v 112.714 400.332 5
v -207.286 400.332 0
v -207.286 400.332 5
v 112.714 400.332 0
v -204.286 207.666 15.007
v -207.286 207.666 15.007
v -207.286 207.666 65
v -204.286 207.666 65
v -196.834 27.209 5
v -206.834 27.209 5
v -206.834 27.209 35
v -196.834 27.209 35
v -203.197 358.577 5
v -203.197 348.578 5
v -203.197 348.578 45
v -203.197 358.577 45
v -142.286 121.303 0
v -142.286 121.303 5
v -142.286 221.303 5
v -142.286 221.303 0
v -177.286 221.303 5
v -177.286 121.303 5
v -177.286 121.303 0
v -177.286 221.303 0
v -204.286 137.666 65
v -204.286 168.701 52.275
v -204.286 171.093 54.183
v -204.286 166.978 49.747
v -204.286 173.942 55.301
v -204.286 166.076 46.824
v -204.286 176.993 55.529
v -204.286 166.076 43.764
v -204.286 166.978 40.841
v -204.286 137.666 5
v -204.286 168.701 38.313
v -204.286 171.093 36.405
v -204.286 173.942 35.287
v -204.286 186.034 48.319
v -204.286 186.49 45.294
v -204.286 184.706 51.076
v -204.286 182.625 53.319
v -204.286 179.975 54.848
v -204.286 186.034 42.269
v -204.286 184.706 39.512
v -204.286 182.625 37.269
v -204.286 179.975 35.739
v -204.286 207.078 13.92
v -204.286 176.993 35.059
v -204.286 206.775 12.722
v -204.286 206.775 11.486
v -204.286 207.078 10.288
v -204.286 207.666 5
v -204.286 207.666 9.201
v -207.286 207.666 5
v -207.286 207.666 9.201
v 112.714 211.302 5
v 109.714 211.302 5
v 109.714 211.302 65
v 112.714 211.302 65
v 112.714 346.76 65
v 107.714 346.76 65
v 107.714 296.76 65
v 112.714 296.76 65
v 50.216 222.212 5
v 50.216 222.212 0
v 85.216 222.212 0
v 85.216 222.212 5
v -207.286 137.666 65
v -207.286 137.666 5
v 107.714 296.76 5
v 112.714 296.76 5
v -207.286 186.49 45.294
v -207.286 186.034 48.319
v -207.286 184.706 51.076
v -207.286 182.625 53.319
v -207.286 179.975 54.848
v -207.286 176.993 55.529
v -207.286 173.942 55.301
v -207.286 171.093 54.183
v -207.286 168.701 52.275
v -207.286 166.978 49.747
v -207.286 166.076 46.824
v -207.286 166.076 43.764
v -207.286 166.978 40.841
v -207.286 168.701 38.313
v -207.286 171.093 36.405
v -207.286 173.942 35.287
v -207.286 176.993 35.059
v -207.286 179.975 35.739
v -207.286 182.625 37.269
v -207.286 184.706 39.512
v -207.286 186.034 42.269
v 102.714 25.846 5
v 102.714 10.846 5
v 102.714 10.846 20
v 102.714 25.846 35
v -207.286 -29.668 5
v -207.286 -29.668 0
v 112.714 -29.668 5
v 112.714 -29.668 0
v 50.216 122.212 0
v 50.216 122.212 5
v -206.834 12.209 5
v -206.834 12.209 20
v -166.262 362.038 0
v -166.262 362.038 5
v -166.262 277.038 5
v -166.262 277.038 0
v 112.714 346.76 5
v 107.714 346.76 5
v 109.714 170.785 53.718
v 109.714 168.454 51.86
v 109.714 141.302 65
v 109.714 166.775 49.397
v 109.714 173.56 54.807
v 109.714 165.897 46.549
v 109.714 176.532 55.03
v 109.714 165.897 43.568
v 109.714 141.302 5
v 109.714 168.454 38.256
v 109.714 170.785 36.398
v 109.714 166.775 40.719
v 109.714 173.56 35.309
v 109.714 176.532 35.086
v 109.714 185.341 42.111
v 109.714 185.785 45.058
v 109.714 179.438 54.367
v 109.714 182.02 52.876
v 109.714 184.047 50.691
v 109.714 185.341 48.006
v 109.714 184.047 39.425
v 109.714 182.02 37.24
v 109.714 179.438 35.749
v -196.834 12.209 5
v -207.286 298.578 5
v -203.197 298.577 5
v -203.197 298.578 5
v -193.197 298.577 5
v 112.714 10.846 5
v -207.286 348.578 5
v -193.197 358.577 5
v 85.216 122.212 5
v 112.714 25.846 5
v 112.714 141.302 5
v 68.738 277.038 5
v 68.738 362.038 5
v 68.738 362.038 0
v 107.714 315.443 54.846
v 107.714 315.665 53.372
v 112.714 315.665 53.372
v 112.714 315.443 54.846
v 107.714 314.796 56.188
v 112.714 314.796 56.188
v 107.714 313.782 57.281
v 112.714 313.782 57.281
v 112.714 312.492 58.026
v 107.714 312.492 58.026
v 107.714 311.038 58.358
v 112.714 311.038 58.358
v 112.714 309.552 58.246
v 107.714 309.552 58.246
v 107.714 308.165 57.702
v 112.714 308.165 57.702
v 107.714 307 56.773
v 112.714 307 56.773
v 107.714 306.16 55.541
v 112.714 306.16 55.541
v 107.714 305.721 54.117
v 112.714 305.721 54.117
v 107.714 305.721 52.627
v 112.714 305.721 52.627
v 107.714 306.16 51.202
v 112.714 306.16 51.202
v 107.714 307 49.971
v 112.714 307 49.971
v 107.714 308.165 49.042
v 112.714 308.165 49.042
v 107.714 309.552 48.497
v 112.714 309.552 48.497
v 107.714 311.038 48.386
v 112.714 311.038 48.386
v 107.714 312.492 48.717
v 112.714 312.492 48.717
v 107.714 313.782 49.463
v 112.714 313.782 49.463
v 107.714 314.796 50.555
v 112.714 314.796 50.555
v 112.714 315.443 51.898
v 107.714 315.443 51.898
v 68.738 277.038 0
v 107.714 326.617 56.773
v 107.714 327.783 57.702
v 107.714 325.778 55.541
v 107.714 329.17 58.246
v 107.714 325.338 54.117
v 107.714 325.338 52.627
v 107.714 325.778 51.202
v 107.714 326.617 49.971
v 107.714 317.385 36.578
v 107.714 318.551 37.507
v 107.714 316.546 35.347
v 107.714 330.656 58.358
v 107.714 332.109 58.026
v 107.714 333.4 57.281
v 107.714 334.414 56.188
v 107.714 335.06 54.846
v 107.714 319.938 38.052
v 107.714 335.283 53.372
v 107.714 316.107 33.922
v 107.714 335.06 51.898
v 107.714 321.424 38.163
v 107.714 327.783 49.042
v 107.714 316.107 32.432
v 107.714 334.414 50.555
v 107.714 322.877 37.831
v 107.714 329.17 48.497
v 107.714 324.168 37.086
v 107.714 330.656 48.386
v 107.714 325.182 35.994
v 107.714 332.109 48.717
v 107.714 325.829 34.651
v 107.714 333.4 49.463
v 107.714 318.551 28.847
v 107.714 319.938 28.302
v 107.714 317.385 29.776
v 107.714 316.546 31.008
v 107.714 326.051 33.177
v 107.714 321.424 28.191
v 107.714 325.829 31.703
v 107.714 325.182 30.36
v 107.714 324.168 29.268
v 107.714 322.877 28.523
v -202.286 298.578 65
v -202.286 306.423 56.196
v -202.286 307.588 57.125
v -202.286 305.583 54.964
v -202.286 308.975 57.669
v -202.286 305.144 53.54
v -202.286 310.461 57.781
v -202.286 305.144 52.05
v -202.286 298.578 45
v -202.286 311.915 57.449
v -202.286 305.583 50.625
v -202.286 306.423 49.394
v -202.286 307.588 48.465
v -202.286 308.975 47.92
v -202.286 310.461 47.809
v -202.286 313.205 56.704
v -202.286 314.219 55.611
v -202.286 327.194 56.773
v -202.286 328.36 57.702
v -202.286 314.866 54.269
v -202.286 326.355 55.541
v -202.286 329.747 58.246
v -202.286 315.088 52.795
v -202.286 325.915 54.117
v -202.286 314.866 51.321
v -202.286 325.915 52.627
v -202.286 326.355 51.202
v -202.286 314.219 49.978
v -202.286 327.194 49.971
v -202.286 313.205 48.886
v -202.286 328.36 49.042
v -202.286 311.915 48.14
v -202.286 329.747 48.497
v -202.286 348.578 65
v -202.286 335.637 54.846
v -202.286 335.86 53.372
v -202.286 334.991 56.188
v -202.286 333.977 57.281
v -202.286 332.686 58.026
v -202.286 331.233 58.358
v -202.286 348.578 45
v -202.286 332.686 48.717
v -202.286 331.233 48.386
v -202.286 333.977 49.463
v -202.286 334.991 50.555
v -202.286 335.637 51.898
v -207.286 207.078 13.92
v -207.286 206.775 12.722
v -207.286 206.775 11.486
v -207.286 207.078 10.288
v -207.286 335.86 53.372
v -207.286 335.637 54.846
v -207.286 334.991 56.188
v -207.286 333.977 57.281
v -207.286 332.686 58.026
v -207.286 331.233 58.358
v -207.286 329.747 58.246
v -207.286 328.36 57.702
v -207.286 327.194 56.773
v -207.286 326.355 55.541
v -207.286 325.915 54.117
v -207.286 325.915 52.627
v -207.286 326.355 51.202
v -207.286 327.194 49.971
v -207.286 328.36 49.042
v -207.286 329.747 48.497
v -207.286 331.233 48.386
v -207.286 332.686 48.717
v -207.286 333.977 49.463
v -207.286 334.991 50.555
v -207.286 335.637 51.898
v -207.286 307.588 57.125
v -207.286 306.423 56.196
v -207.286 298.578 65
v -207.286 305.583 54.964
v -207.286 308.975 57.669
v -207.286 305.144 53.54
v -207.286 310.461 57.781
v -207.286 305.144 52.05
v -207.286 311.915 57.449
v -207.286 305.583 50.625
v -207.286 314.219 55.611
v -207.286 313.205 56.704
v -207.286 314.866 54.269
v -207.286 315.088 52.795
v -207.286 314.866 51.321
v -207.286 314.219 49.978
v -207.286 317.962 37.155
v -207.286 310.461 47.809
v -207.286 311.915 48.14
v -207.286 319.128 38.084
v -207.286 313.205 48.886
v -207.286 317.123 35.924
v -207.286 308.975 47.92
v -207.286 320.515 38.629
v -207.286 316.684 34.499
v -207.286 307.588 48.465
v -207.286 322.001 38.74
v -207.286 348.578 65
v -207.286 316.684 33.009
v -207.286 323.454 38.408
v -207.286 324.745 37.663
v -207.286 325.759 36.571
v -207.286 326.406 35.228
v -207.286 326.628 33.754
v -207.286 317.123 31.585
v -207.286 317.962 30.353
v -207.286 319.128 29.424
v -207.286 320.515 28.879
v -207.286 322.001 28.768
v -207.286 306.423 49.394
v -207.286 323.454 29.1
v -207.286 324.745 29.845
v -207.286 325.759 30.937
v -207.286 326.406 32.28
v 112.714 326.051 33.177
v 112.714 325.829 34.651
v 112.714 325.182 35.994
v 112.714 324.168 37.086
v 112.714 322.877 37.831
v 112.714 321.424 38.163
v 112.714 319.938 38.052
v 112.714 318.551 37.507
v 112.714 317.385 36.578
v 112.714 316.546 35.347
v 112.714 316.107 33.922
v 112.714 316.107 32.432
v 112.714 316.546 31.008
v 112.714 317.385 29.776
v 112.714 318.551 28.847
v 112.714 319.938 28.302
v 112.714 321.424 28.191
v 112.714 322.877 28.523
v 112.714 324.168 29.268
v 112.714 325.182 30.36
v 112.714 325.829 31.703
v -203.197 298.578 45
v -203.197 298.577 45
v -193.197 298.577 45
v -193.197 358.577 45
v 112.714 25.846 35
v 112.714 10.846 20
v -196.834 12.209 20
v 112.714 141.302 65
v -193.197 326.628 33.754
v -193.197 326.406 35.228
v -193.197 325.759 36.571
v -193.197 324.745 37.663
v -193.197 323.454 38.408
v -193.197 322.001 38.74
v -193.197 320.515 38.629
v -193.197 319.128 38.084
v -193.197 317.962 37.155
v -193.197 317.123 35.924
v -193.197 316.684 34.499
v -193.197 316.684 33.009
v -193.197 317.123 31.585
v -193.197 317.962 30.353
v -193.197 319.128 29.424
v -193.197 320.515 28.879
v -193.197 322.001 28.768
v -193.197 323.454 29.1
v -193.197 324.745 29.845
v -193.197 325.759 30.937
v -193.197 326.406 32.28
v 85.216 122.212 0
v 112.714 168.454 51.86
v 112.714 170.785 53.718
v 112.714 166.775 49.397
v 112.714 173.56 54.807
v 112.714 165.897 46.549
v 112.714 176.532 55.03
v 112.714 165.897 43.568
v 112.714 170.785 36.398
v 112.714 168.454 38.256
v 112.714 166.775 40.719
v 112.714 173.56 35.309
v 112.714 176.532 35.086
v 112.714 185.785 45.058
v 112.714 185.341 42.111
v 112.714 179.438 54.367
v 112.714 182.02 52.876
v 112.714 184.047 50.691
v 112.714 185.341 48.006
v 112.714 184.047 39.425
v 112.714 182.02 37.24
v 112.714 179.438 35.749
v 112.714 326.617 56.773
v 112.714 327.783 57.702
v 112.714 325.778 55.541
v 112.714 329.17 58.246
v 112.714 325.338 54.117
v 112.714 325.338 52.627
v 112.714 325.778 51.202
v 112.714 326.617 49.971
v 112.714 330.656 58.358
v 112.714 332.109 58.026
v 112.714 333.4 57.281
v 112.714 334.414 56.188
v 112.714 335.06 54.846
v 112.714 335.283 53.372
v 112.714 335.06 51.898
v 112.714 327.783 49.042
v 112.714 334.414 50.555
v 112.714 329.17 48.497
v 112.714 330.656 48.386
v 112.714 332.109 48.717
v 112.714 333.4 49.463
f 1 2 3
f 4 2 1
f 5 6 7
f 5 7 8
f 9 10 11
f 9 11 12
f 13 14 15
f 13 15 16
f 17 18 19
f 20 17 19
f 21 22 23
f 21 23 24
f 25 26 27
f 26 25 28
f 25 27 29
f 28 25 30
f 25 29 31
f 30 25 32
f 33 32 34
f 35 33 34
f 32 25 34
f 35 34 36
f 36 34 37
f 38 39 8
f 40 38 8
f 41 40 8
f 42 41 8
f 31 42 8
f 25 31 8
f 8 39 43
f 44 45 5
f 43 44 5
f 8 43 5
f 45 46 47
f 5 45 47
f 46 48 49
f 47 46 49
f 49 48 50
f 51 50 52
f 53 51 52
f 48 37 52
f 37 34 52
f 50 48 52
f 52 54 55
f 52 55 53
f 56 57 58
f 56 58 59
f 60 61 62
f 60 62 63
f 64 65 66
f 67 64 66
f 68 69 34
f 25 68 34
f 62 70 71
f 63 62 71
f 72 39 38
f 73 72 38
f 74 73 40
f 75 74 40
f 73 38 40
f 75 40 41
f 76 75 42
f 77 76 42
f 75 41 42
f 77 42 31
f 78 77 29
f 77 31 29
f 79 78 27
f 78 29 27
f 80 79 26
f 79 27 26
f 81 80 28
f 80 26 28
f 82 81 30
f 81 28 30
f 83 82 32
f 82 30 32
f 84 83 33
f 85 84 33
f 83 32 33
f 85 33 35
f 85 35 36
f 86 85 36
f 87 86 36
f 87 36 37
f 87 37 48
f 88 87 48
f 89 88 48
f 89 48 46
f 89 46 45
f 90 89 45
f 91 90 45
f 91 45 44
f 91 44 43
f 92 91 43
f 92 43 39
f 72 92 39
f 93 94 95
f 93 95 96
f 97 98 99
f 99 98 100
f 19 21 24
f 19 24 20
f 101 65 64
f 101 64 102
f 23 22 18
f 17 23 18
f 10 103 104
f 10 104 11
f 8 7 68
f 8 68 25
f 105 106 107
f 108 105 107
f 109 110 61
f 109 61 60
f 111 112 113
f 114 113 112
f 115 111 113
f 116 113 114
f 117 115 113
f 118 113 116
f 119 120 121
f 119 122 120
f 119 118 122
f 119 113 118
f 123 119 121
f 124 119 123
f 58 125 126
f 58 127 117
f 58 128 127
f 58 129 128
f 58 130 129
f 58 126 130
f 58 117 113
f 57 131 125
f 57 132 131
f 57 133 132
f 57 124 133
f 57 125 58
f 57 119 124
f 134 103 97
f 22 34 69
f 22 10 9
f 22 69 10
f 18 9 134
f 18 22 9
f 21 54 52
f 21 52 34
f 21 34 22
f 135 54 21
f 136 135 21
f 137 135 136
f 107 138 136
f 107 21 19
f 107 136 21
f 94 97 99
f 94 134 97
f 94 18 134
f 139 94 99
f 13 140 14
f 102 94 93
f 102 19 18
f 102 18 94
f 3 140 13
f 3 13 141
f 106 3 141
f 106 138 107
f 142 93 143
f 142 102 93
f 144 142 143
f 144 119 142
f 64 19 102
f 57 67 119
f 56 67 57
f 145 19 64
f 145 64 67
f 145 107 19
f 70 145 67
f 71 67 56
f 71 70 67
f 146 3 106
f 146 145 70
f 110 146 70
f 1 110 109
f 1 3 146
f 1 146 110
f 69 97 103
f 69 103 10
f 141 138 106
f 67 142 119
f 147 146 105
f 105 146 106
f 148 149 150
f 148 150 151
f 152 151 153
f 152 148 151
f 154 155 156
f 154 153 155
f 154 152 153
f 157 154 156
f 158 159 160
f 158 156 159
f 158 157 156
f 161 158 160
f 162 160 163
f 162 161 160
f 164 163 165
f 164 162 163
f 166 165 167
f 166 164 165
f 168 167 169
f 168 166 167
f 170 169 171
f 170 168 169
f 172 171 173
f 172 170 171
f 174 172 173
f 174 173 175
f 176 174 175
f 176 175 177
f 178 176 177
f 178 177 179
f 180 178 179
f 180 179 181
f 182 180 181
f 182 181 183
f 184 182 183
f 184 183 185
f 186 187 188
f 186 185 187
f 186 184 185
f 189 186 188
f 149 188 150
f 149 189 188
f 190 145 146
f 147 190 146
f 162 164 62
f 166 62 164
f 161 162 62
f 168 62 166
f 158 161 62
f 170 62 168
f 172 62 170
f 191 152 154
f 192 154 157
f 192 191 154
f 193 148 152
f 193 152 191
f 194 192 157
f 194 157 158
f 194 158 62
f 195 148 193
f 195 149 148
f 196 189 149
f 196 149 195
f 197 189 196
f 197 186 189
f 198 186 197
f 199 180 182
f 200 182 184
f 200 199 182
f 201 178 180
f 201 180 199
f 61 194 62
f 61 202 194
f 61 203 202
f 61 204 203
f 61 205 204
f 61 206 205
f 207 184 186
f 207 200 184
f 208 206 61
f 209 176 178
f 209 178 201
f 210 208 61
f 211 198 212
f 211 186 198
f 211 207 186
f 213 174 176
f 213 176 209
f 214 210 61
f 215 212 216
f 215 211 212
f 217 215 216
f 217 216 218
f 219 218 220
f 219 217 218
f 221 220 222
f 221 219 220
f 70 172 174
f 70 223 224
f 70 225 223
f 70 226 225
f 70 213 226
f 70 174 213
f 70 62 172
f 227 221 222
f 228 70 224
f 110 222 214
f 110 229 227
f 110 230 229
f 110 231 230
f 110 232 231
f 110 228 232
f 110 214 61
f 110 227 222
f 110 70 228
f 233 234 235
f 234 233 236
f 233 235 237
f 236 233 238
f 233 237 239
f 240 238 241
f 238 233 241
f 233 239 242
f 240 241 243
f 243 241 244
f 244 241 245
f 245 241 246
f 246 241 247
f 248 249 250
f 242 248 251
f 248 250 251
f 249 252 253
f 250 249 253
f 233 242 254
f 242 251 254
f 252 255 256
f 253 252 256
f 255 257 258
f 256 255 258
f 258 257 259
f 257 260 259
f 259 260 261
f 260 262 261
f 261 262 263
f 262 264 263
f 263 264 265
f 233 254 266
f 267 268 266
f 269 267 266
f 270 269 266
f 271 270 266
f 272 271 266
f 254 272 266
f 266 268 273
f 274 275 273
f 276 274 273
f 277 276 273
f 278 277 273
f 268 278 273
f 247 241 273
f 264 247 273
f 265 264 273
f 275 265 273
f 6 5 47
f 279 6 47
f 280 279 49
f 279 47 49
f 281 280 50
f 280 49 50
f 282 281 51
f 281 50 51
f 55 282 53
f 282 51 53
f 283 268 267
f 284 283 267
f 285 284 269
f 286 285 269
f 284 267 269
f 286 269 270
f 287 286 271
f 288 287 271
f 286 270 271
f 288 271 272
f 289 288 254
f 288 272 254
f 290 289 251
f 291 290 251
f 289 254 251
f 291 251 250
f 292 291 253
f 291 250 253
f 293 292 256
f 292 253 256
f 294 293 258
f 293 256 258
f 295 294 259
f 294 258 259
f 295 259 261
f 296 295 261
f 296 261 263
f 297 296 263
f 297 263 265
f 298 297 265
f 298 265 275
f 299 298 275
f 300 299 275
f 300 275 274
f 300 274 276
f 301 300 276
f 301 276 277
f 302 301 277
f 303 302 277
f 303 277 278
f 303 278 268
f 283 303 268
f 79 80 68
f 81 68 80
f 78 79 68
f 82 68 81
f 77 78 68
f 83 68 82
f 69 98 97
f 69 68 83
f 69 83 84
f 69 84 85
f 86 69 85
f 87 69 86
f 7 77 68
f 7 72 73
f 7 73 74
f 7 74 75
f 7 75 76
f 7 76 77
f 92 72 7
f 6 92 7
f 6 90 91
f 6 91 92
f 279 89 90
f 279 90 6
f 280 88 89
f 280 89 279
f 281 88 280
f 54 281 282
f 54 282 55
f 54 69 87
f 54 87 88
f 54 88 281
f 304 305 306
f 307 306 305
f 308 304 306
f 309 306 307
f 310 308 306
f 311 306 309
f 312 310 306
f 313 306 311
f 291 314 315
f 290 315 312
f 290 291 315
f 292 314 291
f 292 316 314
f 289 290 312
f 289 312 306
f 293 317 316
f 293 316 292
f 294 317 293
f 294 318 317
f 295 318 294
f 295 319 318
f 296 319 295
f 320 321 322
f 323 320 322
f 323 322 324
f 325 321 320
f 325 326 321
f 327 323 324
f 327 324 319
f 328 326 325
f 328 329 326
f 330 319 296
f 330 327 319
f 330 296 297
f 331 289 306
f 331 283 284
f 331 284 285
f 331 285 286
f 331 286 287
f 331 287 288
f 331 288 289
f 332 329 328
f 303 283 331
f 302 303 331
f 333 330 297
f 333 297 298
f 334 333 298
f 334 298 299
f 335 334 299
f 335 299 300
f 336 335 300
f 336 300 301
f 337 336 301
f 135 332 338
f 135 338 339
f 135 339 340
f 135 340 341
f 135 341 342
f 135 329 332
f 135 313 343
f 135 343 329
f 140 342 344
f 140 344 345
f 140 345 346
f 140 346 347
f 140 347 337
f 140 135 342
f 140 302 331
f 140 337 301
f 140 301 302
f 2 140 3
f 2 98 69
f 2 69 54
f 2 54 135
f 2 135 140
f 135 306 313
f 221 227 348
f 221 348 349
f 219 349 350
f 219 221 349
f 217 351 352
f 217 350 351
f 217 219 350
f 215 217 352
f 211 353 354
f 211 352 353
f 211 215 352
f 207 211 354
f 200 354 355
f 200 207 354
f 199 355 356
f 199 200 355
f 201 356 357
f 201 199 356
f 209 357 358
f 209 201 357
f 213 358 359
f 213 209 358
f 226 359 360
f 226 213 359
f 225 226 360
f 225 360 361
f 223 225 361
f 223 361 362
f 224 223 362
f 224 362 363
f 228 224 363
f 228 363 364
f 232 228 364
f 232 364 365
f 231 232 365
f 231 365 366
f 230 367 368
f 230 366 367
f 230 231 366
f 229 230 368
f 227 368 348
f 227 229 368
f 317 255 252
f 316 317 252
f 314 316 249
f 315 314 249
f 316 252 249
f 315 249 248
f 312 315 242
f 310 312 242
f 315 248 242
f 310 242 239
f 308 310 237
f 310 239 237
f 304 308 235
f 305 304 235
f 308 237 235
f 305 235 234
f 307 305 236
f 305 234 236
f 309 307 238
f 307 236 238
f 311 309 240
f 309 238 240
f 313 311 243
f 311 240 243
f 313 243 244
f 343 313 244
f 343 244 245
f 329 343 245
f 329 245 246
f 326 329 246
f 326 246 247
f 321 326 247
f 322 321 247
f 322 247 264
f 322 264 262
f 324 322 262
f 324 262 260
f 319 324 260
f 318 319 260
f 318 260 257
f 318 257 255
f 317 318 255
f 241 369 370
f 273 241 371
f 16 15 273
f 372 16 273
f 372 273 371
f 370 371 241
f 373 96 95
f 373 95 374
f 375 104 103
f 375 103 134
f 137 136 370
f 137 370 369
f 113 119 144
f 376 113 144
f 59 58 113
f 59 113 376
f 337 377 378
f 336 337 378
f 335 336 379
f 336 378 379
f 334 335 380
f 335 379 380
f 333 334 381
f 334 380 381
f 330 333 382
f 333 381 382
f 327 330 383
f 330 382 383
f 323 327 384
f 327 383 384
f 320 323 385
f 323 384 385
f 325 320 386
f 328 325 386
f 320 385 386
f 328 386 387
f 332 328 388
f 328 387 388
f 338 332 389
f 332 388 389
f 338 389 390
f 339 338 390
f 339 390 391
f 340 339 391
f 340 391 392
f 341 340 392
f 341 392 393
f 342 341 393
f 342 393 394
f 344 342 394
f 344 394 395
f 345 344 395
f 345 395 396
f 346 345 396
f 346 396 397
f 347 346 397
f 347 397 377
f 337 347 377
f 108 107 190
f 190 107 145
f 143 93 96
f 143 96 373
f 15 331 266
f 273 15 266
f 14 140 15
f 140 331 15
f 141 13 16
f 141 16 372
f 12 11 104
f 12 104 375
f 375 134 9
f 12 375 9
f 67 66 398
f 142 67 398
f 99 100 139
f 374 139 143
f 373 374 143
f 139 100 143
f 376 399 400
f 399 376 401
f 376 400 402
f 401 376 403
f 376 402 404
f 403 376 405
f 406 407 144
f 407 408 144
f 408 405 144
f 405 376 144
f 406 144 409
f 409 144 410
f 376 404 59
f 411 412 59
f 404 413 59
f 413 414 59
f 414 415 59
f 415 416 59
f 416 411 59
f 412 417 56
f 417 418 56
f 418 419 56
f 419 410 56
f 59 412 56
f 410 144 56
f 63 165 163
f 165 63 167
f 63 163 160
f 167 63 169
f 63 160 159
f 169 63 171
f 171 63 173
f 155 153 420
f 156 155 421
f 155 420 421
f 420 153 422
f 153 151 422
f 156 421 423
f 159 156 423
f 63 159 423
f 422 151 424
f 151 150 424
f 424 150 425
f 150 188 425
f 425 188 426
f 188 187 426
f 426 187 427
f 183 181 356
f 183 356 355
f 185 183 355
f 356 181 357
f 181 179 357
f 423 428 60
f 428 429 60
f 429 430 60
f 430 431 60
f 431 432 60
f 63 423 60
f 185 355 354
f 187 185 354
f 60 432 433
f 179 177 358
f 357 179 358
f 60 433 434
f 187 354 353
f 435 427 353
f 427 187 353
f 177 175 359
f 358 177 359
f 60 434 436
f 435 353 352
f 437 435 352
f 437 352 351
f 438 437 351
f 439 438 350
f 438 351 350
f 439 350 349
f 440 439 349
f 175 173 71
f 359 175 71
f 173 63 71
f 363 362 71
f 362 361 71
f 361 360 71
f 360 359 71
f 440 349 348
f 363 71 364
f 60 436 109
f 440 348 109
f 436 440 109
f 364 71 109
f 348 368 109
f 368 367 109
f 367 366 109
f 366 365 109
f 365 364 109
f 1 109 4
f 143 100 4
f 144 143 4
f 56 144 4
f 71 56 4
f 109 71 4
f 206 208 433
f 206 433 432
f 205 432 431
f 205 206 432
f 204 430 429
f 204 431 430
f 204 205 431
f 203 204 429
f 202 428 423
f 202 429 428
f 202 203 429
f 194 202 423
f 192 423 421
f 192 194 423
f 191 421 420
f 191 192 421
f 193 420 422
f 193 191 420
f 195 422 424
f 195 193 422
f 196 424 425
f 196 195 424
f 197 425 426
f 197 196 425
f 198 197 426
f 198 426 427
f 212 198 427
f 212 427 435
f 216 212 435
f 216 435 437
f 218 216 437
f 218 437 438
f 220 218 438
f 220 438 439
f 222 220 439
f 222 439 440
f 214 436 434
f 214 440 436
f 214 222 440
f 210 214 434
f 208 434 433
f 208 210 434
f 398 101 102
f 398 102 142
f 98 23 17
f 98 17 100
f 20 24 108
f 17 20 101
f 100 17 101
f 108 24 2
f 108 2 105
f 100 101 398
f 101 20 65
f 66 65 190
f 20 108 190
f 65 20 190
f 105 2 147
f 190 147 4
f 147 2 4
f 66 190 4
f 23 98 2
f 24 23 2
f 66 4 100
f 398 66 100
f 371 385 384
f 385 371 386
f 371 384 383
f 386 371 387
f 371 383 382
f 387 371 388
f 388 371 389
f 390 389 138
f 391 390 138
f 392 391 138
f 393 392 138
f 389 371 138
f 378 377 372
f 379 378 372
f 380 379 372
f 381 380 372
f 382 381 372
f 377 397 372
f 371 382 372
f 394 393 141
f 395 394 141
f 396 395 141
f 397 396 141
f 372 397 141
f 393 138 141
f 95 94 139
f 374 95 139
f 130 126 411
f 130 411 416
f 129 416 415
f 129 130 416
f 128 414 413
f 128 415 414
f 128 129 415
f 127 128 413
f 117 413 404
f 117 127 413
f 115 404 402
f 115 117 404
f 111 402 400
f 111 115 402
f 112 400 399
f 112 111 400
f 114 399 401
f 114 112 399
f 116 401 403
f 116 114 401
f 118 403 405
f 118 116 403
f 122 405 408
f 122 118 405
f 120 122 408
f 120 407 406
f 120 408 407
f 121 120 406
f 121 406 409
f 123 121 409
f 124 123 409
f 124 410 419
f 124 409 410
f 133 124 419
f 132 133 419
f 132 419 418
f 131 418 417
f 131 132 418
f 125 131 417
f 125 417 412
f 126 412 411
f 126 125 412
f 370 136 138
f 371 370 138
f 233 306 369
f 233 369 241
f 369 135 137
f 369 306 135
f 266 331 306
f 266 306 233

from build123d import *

# Parameters (mm, degrees)
F0_W      = 320
F0_H      = 430
F1_DEPTH  = 5
F2_W      = 35
F2_H      = 100
F3_DEPTH  = 5
F4_W      = 35
F4_H      = 100
F5_DEPTH  = 5
F7_DEPTH  = 5
F8_W      = 3
F8_H      = 70
F9_DEPTH  = 60
F10_W     = 3
F10_H     = 70
F11_DEPTH = 60
F12_W     = 5
F12_H     = 50
F13_DEPTH = 60
F14_W     = 5
F14_H     = 50
F15_DEPTH = 60
F16_R     = 10
F17_DEPTH = 120
F18_R     = 10.2640382995
F19_DEPTH = 240
F20_W     = 10
F20_H     = 15
F21_DEPTH = 30
F22_SIZE  = 14.99999
F23_W     = 10
F23_H     = 15
F24_DEPTH = 30
F25_SIZE  = 14.99999
F26_W     = 10
F26_H     = 60
F27_DEPTH = 40
F28_R     = 5
F29_DEPTH = 240
F30_R     = 5
F31_DEPTH = 240
F32_R     = 5
F33_DEPTH = 250
F34_R     = 5
F35_DEPTH = 300
F36_R     = 5
F37_DEPTH = 300
F38_R     = 5
F39_DEPTH = 300
F40_R     = 10
F41_DEPTH = 207.2868810425
F42_R     = 5
F43_DEPTH = 207.2868810425
F44_R     = 5
F45_DEPTH = 207.2868810425
F46_R     = 5
F47_DEPTH = 207.2868810425
F48_R     = 5
F49_DEPTH = 207.2868810425


# Not quite as in the source:
# - a fillet or chamfer is up to 0.001 mm smaller than in the source, because OpenCascade refuses the exact size


with BuildPart() as f1:
    # F0 (on Top) → F1 (new body)
    with BuildSketch(Plane.XY):
        with Locations((-47.2858810425, 185.3322760761)):
            Rectangle(F0_W, F0_H)
    extrude(amount=F1_DEPTH)

    # F2 (on face) → F3 (cut)
    with BuildSketch(Plane.XY.offset(5)):
        with Locations((-159.7858810425, 171.3026314974)):
            Rectangle(F2_W, F2_H)
    extrude(amount=-F3_DEPTH, mode=Mode.SUBTRACT)

    # F4 (on face) → F5 (cut)
    with BuildSketch(Plane(origin=(0, 0, 0), x_dir=(1, 0, 0), z_dir=(0, 0, -1))):
        with Locations((67.7159577608, -172.2117364407)):
            Rectangle(F4_W, F4_H)
    extrude(amount=-F5_DEPTH, mode=Mode.SUBTRACT)

    # F6 (on face) → F7 (cut)
    with BuildSketch(Plane.XY.offset(5)):
        Polygon((68.7382593751, 362.0384633541), (-166.2617406249, 362.0384633541), (-166.2617406249, 277.0384633541), (-65.0134384632, 277.0384633541), (-48.7617406249, 277.0384633541), (68.7382593751, 277.0384633541), align=None)
    extrude(amount=-F7_DEPTH, mode=Mode.SUBTRACT)

    # F8 (on face) → F9 (join)
    with BuildSketch(Plane.XY.offset(5)):
        with Locations((-205.7858810425, 172.665733695)):
            Rectangle(F8_W, F8_H)
    extrude(amount=F9_DEPTH)

    # F10 (on face) → F11 (join)
    with BuildSketch(Plane.XY.offset(5)):
        with Locations((111.2141189575, 176.3021534681)):
            Rectangle(F10_W, F10_H)
    extrude(amount=F11_DEPTH)

    # F12 (on face) → F13 (join)
    with BuildSketch(Plane.XY.offset(5)):
        with Locations((-204.7858810425, 323.5781848431)):
            Rectangle(F12_W, F12_H)
    extrude(amount=F13_DEPTH)

    # F14 (on face) → F15 (join)
    with BuildSketch(Plane.XY.offset(5)):
        with Locations((110.2141189575, 321.7600047588)):
            Rectangle(F14_W, F14_H)
    extrude(amount=F15_DEPTH)

    # F16 (on Right) → F17 (cut)
    with BuildSketch(Plane.YZ):
        with Locations((175.784942263, 45.0581042336)):
            Circle(F16_R)
    extrude(amount=F17_DEPTH, mode=Mode.SUBTRACT)

    # F18 (on Right) → F19 (cut)
    with BuildSketch(Plane.YZ):
        with Locations((176.2254685163, 45.2939495444)):
            Circle(F18_R)
    extrude(amount=-F19_DEPTH, mode=Mode.SUBTRACT)

    # F20 (on face) → F21 (join)
    with BuildSketch(Plane.XY.offset(5)):
        with Locations((107.7141189575, 18.3457679302)):
            Rectangle(F20_W, F20_H)
    extrude(amount=F21_DEPTH)

    # F22 (size 15 in the source; OpenCascade refuses exactly that, so slightly less here)
    f22_edges = [f1.edges().sort_by_distance(p)[0] for p in [
        (107.714119, 10.845768, 35),
    ]]
    chamfer(f22_edges, length=F22_SIZE)

    # F23 (on face) → F24 (join)
    with BuildSketch(Plane.XY.offset(5)):
        with Locations((-201.83388412, 19.7091826051)):
            Rectangle(F23_W, F23_H)
    extrude(amount=F24_DEPTH)

    # F25 (size 15 in the source; OpenCascade refuses exactly that, so slightly less here)
    f25_edges = [f1.edges().sort_by_distance(p)[0] for p in [
        (-201.833884, 12.209183, 35),
    ]]
    chamfer(f25_edges, length=F25_SIZE)

    # F26 (on face) → F27 (join)
    with BuildSketch(Plane.XY.offset(5)):
        with Locations((-198.1973099709, 328.5773980618)):
            Rectangle(F26_W, F26_H)
    extrude(amount=F27_DEPTH)

    # F28 (on Right) → F29 (cut)
    with BuildSketch(Plane.YZ):
        with Locations((310.6648027897, 53.3718466759)):
            Circle(F28_R)
    extrude(amount=F29_DEPTH, mode=Mode.SUBTRACT)

    # F30 (on Right) → F31 (cut)
    with BuildSketch(Plane.YZ):
        with Locations((330.2825987339, 53.3718466759)):
            Circle(F30_R)
    extrude(amount=F31_DEPTH, mode=Mode.SUBTRACT)

    # F32 (on Right) → F33 (cut)
    with BuildSketch(Plane.YZ):
        with Locations((321.0507035255, 33.1770926714)):
            Circle(F32_R)
    extrude(amount=F33_DEPTH, mode=Mode.SUBTRACT)

    # F34 (on Right) → F35 (cut)
    with BuildSketch(Plane.YZ):
        with Locations((310.0878298283, 52.794855088)):
            Circle(F34_R)
    extrude(amount=-F35_DEPTH, mode=Mode.SUBTRACT)

    # F36 (on Right) → F37 (cut)
    with BuildSketch(Plane.YZ):
        with Locations((330.8595716953, 53.3718466759)):
            Circle(F36_R)
    extrude(amount=-F37_DEPTH, mode=Mode.SUBTRACT)

    # F38 (on Right) → F39 (cut)
    with BuildSketch(Plane.YZ):
        with Locations((321.627676487, 33.7540879846)):
            Circle(F38_R)
    extrude(amount=-F39_DEPTH, mode=Mode.SUBTRACT)

    # F40 (on Right) → F41 (cut, through all)
    with BuildSketch(Plane.YZ):
        with Locations((228.0015647411, 27.0902961493)):
            Circle(F40_R)
    extrude(amount=-F41_DEPTH, mode=Mode.SUBTRACT)

    # F42 (on Right) → F43 (cut, through all)
    with BuildSketch(Plane.YZ):
        with Locations((241.425678134, 41.8319888413)):
            Circle(F42_R)
    extrude(amount=-F43_DEPTH, mode=Mode.SUBTRACT)

    # F44 (on Right) → F45 (cut, through all)
    with BuildSketch(Plane.YZ):
        with Locations((240.8486753702, 12.9823405296)):
            Circle(F44_R)
    extrude(amount=-F45_DEPTH, mode=Mode.SUBTRACT)

    # F46 (on Right) → F47 (cut, through all)
    with BuildSketch(Plane.YZ):
        with Locations((213.0800783634, 41.6209772229)):
            Circle(F46_R)
    extrude(amount=-F47_DEPTH, mode=Mode.SUBTRACT)

    # F48 (on Right) → F49 (cut, through all)
    with BuildSketch(Plane.YZ):
        with Locations((211.7366492748, 12.104251422)):
            Circle(F48_R)
    extrude(amount=-F49_DEPTH, mode=Mode.SUBTRACT)


solid = f1.part
